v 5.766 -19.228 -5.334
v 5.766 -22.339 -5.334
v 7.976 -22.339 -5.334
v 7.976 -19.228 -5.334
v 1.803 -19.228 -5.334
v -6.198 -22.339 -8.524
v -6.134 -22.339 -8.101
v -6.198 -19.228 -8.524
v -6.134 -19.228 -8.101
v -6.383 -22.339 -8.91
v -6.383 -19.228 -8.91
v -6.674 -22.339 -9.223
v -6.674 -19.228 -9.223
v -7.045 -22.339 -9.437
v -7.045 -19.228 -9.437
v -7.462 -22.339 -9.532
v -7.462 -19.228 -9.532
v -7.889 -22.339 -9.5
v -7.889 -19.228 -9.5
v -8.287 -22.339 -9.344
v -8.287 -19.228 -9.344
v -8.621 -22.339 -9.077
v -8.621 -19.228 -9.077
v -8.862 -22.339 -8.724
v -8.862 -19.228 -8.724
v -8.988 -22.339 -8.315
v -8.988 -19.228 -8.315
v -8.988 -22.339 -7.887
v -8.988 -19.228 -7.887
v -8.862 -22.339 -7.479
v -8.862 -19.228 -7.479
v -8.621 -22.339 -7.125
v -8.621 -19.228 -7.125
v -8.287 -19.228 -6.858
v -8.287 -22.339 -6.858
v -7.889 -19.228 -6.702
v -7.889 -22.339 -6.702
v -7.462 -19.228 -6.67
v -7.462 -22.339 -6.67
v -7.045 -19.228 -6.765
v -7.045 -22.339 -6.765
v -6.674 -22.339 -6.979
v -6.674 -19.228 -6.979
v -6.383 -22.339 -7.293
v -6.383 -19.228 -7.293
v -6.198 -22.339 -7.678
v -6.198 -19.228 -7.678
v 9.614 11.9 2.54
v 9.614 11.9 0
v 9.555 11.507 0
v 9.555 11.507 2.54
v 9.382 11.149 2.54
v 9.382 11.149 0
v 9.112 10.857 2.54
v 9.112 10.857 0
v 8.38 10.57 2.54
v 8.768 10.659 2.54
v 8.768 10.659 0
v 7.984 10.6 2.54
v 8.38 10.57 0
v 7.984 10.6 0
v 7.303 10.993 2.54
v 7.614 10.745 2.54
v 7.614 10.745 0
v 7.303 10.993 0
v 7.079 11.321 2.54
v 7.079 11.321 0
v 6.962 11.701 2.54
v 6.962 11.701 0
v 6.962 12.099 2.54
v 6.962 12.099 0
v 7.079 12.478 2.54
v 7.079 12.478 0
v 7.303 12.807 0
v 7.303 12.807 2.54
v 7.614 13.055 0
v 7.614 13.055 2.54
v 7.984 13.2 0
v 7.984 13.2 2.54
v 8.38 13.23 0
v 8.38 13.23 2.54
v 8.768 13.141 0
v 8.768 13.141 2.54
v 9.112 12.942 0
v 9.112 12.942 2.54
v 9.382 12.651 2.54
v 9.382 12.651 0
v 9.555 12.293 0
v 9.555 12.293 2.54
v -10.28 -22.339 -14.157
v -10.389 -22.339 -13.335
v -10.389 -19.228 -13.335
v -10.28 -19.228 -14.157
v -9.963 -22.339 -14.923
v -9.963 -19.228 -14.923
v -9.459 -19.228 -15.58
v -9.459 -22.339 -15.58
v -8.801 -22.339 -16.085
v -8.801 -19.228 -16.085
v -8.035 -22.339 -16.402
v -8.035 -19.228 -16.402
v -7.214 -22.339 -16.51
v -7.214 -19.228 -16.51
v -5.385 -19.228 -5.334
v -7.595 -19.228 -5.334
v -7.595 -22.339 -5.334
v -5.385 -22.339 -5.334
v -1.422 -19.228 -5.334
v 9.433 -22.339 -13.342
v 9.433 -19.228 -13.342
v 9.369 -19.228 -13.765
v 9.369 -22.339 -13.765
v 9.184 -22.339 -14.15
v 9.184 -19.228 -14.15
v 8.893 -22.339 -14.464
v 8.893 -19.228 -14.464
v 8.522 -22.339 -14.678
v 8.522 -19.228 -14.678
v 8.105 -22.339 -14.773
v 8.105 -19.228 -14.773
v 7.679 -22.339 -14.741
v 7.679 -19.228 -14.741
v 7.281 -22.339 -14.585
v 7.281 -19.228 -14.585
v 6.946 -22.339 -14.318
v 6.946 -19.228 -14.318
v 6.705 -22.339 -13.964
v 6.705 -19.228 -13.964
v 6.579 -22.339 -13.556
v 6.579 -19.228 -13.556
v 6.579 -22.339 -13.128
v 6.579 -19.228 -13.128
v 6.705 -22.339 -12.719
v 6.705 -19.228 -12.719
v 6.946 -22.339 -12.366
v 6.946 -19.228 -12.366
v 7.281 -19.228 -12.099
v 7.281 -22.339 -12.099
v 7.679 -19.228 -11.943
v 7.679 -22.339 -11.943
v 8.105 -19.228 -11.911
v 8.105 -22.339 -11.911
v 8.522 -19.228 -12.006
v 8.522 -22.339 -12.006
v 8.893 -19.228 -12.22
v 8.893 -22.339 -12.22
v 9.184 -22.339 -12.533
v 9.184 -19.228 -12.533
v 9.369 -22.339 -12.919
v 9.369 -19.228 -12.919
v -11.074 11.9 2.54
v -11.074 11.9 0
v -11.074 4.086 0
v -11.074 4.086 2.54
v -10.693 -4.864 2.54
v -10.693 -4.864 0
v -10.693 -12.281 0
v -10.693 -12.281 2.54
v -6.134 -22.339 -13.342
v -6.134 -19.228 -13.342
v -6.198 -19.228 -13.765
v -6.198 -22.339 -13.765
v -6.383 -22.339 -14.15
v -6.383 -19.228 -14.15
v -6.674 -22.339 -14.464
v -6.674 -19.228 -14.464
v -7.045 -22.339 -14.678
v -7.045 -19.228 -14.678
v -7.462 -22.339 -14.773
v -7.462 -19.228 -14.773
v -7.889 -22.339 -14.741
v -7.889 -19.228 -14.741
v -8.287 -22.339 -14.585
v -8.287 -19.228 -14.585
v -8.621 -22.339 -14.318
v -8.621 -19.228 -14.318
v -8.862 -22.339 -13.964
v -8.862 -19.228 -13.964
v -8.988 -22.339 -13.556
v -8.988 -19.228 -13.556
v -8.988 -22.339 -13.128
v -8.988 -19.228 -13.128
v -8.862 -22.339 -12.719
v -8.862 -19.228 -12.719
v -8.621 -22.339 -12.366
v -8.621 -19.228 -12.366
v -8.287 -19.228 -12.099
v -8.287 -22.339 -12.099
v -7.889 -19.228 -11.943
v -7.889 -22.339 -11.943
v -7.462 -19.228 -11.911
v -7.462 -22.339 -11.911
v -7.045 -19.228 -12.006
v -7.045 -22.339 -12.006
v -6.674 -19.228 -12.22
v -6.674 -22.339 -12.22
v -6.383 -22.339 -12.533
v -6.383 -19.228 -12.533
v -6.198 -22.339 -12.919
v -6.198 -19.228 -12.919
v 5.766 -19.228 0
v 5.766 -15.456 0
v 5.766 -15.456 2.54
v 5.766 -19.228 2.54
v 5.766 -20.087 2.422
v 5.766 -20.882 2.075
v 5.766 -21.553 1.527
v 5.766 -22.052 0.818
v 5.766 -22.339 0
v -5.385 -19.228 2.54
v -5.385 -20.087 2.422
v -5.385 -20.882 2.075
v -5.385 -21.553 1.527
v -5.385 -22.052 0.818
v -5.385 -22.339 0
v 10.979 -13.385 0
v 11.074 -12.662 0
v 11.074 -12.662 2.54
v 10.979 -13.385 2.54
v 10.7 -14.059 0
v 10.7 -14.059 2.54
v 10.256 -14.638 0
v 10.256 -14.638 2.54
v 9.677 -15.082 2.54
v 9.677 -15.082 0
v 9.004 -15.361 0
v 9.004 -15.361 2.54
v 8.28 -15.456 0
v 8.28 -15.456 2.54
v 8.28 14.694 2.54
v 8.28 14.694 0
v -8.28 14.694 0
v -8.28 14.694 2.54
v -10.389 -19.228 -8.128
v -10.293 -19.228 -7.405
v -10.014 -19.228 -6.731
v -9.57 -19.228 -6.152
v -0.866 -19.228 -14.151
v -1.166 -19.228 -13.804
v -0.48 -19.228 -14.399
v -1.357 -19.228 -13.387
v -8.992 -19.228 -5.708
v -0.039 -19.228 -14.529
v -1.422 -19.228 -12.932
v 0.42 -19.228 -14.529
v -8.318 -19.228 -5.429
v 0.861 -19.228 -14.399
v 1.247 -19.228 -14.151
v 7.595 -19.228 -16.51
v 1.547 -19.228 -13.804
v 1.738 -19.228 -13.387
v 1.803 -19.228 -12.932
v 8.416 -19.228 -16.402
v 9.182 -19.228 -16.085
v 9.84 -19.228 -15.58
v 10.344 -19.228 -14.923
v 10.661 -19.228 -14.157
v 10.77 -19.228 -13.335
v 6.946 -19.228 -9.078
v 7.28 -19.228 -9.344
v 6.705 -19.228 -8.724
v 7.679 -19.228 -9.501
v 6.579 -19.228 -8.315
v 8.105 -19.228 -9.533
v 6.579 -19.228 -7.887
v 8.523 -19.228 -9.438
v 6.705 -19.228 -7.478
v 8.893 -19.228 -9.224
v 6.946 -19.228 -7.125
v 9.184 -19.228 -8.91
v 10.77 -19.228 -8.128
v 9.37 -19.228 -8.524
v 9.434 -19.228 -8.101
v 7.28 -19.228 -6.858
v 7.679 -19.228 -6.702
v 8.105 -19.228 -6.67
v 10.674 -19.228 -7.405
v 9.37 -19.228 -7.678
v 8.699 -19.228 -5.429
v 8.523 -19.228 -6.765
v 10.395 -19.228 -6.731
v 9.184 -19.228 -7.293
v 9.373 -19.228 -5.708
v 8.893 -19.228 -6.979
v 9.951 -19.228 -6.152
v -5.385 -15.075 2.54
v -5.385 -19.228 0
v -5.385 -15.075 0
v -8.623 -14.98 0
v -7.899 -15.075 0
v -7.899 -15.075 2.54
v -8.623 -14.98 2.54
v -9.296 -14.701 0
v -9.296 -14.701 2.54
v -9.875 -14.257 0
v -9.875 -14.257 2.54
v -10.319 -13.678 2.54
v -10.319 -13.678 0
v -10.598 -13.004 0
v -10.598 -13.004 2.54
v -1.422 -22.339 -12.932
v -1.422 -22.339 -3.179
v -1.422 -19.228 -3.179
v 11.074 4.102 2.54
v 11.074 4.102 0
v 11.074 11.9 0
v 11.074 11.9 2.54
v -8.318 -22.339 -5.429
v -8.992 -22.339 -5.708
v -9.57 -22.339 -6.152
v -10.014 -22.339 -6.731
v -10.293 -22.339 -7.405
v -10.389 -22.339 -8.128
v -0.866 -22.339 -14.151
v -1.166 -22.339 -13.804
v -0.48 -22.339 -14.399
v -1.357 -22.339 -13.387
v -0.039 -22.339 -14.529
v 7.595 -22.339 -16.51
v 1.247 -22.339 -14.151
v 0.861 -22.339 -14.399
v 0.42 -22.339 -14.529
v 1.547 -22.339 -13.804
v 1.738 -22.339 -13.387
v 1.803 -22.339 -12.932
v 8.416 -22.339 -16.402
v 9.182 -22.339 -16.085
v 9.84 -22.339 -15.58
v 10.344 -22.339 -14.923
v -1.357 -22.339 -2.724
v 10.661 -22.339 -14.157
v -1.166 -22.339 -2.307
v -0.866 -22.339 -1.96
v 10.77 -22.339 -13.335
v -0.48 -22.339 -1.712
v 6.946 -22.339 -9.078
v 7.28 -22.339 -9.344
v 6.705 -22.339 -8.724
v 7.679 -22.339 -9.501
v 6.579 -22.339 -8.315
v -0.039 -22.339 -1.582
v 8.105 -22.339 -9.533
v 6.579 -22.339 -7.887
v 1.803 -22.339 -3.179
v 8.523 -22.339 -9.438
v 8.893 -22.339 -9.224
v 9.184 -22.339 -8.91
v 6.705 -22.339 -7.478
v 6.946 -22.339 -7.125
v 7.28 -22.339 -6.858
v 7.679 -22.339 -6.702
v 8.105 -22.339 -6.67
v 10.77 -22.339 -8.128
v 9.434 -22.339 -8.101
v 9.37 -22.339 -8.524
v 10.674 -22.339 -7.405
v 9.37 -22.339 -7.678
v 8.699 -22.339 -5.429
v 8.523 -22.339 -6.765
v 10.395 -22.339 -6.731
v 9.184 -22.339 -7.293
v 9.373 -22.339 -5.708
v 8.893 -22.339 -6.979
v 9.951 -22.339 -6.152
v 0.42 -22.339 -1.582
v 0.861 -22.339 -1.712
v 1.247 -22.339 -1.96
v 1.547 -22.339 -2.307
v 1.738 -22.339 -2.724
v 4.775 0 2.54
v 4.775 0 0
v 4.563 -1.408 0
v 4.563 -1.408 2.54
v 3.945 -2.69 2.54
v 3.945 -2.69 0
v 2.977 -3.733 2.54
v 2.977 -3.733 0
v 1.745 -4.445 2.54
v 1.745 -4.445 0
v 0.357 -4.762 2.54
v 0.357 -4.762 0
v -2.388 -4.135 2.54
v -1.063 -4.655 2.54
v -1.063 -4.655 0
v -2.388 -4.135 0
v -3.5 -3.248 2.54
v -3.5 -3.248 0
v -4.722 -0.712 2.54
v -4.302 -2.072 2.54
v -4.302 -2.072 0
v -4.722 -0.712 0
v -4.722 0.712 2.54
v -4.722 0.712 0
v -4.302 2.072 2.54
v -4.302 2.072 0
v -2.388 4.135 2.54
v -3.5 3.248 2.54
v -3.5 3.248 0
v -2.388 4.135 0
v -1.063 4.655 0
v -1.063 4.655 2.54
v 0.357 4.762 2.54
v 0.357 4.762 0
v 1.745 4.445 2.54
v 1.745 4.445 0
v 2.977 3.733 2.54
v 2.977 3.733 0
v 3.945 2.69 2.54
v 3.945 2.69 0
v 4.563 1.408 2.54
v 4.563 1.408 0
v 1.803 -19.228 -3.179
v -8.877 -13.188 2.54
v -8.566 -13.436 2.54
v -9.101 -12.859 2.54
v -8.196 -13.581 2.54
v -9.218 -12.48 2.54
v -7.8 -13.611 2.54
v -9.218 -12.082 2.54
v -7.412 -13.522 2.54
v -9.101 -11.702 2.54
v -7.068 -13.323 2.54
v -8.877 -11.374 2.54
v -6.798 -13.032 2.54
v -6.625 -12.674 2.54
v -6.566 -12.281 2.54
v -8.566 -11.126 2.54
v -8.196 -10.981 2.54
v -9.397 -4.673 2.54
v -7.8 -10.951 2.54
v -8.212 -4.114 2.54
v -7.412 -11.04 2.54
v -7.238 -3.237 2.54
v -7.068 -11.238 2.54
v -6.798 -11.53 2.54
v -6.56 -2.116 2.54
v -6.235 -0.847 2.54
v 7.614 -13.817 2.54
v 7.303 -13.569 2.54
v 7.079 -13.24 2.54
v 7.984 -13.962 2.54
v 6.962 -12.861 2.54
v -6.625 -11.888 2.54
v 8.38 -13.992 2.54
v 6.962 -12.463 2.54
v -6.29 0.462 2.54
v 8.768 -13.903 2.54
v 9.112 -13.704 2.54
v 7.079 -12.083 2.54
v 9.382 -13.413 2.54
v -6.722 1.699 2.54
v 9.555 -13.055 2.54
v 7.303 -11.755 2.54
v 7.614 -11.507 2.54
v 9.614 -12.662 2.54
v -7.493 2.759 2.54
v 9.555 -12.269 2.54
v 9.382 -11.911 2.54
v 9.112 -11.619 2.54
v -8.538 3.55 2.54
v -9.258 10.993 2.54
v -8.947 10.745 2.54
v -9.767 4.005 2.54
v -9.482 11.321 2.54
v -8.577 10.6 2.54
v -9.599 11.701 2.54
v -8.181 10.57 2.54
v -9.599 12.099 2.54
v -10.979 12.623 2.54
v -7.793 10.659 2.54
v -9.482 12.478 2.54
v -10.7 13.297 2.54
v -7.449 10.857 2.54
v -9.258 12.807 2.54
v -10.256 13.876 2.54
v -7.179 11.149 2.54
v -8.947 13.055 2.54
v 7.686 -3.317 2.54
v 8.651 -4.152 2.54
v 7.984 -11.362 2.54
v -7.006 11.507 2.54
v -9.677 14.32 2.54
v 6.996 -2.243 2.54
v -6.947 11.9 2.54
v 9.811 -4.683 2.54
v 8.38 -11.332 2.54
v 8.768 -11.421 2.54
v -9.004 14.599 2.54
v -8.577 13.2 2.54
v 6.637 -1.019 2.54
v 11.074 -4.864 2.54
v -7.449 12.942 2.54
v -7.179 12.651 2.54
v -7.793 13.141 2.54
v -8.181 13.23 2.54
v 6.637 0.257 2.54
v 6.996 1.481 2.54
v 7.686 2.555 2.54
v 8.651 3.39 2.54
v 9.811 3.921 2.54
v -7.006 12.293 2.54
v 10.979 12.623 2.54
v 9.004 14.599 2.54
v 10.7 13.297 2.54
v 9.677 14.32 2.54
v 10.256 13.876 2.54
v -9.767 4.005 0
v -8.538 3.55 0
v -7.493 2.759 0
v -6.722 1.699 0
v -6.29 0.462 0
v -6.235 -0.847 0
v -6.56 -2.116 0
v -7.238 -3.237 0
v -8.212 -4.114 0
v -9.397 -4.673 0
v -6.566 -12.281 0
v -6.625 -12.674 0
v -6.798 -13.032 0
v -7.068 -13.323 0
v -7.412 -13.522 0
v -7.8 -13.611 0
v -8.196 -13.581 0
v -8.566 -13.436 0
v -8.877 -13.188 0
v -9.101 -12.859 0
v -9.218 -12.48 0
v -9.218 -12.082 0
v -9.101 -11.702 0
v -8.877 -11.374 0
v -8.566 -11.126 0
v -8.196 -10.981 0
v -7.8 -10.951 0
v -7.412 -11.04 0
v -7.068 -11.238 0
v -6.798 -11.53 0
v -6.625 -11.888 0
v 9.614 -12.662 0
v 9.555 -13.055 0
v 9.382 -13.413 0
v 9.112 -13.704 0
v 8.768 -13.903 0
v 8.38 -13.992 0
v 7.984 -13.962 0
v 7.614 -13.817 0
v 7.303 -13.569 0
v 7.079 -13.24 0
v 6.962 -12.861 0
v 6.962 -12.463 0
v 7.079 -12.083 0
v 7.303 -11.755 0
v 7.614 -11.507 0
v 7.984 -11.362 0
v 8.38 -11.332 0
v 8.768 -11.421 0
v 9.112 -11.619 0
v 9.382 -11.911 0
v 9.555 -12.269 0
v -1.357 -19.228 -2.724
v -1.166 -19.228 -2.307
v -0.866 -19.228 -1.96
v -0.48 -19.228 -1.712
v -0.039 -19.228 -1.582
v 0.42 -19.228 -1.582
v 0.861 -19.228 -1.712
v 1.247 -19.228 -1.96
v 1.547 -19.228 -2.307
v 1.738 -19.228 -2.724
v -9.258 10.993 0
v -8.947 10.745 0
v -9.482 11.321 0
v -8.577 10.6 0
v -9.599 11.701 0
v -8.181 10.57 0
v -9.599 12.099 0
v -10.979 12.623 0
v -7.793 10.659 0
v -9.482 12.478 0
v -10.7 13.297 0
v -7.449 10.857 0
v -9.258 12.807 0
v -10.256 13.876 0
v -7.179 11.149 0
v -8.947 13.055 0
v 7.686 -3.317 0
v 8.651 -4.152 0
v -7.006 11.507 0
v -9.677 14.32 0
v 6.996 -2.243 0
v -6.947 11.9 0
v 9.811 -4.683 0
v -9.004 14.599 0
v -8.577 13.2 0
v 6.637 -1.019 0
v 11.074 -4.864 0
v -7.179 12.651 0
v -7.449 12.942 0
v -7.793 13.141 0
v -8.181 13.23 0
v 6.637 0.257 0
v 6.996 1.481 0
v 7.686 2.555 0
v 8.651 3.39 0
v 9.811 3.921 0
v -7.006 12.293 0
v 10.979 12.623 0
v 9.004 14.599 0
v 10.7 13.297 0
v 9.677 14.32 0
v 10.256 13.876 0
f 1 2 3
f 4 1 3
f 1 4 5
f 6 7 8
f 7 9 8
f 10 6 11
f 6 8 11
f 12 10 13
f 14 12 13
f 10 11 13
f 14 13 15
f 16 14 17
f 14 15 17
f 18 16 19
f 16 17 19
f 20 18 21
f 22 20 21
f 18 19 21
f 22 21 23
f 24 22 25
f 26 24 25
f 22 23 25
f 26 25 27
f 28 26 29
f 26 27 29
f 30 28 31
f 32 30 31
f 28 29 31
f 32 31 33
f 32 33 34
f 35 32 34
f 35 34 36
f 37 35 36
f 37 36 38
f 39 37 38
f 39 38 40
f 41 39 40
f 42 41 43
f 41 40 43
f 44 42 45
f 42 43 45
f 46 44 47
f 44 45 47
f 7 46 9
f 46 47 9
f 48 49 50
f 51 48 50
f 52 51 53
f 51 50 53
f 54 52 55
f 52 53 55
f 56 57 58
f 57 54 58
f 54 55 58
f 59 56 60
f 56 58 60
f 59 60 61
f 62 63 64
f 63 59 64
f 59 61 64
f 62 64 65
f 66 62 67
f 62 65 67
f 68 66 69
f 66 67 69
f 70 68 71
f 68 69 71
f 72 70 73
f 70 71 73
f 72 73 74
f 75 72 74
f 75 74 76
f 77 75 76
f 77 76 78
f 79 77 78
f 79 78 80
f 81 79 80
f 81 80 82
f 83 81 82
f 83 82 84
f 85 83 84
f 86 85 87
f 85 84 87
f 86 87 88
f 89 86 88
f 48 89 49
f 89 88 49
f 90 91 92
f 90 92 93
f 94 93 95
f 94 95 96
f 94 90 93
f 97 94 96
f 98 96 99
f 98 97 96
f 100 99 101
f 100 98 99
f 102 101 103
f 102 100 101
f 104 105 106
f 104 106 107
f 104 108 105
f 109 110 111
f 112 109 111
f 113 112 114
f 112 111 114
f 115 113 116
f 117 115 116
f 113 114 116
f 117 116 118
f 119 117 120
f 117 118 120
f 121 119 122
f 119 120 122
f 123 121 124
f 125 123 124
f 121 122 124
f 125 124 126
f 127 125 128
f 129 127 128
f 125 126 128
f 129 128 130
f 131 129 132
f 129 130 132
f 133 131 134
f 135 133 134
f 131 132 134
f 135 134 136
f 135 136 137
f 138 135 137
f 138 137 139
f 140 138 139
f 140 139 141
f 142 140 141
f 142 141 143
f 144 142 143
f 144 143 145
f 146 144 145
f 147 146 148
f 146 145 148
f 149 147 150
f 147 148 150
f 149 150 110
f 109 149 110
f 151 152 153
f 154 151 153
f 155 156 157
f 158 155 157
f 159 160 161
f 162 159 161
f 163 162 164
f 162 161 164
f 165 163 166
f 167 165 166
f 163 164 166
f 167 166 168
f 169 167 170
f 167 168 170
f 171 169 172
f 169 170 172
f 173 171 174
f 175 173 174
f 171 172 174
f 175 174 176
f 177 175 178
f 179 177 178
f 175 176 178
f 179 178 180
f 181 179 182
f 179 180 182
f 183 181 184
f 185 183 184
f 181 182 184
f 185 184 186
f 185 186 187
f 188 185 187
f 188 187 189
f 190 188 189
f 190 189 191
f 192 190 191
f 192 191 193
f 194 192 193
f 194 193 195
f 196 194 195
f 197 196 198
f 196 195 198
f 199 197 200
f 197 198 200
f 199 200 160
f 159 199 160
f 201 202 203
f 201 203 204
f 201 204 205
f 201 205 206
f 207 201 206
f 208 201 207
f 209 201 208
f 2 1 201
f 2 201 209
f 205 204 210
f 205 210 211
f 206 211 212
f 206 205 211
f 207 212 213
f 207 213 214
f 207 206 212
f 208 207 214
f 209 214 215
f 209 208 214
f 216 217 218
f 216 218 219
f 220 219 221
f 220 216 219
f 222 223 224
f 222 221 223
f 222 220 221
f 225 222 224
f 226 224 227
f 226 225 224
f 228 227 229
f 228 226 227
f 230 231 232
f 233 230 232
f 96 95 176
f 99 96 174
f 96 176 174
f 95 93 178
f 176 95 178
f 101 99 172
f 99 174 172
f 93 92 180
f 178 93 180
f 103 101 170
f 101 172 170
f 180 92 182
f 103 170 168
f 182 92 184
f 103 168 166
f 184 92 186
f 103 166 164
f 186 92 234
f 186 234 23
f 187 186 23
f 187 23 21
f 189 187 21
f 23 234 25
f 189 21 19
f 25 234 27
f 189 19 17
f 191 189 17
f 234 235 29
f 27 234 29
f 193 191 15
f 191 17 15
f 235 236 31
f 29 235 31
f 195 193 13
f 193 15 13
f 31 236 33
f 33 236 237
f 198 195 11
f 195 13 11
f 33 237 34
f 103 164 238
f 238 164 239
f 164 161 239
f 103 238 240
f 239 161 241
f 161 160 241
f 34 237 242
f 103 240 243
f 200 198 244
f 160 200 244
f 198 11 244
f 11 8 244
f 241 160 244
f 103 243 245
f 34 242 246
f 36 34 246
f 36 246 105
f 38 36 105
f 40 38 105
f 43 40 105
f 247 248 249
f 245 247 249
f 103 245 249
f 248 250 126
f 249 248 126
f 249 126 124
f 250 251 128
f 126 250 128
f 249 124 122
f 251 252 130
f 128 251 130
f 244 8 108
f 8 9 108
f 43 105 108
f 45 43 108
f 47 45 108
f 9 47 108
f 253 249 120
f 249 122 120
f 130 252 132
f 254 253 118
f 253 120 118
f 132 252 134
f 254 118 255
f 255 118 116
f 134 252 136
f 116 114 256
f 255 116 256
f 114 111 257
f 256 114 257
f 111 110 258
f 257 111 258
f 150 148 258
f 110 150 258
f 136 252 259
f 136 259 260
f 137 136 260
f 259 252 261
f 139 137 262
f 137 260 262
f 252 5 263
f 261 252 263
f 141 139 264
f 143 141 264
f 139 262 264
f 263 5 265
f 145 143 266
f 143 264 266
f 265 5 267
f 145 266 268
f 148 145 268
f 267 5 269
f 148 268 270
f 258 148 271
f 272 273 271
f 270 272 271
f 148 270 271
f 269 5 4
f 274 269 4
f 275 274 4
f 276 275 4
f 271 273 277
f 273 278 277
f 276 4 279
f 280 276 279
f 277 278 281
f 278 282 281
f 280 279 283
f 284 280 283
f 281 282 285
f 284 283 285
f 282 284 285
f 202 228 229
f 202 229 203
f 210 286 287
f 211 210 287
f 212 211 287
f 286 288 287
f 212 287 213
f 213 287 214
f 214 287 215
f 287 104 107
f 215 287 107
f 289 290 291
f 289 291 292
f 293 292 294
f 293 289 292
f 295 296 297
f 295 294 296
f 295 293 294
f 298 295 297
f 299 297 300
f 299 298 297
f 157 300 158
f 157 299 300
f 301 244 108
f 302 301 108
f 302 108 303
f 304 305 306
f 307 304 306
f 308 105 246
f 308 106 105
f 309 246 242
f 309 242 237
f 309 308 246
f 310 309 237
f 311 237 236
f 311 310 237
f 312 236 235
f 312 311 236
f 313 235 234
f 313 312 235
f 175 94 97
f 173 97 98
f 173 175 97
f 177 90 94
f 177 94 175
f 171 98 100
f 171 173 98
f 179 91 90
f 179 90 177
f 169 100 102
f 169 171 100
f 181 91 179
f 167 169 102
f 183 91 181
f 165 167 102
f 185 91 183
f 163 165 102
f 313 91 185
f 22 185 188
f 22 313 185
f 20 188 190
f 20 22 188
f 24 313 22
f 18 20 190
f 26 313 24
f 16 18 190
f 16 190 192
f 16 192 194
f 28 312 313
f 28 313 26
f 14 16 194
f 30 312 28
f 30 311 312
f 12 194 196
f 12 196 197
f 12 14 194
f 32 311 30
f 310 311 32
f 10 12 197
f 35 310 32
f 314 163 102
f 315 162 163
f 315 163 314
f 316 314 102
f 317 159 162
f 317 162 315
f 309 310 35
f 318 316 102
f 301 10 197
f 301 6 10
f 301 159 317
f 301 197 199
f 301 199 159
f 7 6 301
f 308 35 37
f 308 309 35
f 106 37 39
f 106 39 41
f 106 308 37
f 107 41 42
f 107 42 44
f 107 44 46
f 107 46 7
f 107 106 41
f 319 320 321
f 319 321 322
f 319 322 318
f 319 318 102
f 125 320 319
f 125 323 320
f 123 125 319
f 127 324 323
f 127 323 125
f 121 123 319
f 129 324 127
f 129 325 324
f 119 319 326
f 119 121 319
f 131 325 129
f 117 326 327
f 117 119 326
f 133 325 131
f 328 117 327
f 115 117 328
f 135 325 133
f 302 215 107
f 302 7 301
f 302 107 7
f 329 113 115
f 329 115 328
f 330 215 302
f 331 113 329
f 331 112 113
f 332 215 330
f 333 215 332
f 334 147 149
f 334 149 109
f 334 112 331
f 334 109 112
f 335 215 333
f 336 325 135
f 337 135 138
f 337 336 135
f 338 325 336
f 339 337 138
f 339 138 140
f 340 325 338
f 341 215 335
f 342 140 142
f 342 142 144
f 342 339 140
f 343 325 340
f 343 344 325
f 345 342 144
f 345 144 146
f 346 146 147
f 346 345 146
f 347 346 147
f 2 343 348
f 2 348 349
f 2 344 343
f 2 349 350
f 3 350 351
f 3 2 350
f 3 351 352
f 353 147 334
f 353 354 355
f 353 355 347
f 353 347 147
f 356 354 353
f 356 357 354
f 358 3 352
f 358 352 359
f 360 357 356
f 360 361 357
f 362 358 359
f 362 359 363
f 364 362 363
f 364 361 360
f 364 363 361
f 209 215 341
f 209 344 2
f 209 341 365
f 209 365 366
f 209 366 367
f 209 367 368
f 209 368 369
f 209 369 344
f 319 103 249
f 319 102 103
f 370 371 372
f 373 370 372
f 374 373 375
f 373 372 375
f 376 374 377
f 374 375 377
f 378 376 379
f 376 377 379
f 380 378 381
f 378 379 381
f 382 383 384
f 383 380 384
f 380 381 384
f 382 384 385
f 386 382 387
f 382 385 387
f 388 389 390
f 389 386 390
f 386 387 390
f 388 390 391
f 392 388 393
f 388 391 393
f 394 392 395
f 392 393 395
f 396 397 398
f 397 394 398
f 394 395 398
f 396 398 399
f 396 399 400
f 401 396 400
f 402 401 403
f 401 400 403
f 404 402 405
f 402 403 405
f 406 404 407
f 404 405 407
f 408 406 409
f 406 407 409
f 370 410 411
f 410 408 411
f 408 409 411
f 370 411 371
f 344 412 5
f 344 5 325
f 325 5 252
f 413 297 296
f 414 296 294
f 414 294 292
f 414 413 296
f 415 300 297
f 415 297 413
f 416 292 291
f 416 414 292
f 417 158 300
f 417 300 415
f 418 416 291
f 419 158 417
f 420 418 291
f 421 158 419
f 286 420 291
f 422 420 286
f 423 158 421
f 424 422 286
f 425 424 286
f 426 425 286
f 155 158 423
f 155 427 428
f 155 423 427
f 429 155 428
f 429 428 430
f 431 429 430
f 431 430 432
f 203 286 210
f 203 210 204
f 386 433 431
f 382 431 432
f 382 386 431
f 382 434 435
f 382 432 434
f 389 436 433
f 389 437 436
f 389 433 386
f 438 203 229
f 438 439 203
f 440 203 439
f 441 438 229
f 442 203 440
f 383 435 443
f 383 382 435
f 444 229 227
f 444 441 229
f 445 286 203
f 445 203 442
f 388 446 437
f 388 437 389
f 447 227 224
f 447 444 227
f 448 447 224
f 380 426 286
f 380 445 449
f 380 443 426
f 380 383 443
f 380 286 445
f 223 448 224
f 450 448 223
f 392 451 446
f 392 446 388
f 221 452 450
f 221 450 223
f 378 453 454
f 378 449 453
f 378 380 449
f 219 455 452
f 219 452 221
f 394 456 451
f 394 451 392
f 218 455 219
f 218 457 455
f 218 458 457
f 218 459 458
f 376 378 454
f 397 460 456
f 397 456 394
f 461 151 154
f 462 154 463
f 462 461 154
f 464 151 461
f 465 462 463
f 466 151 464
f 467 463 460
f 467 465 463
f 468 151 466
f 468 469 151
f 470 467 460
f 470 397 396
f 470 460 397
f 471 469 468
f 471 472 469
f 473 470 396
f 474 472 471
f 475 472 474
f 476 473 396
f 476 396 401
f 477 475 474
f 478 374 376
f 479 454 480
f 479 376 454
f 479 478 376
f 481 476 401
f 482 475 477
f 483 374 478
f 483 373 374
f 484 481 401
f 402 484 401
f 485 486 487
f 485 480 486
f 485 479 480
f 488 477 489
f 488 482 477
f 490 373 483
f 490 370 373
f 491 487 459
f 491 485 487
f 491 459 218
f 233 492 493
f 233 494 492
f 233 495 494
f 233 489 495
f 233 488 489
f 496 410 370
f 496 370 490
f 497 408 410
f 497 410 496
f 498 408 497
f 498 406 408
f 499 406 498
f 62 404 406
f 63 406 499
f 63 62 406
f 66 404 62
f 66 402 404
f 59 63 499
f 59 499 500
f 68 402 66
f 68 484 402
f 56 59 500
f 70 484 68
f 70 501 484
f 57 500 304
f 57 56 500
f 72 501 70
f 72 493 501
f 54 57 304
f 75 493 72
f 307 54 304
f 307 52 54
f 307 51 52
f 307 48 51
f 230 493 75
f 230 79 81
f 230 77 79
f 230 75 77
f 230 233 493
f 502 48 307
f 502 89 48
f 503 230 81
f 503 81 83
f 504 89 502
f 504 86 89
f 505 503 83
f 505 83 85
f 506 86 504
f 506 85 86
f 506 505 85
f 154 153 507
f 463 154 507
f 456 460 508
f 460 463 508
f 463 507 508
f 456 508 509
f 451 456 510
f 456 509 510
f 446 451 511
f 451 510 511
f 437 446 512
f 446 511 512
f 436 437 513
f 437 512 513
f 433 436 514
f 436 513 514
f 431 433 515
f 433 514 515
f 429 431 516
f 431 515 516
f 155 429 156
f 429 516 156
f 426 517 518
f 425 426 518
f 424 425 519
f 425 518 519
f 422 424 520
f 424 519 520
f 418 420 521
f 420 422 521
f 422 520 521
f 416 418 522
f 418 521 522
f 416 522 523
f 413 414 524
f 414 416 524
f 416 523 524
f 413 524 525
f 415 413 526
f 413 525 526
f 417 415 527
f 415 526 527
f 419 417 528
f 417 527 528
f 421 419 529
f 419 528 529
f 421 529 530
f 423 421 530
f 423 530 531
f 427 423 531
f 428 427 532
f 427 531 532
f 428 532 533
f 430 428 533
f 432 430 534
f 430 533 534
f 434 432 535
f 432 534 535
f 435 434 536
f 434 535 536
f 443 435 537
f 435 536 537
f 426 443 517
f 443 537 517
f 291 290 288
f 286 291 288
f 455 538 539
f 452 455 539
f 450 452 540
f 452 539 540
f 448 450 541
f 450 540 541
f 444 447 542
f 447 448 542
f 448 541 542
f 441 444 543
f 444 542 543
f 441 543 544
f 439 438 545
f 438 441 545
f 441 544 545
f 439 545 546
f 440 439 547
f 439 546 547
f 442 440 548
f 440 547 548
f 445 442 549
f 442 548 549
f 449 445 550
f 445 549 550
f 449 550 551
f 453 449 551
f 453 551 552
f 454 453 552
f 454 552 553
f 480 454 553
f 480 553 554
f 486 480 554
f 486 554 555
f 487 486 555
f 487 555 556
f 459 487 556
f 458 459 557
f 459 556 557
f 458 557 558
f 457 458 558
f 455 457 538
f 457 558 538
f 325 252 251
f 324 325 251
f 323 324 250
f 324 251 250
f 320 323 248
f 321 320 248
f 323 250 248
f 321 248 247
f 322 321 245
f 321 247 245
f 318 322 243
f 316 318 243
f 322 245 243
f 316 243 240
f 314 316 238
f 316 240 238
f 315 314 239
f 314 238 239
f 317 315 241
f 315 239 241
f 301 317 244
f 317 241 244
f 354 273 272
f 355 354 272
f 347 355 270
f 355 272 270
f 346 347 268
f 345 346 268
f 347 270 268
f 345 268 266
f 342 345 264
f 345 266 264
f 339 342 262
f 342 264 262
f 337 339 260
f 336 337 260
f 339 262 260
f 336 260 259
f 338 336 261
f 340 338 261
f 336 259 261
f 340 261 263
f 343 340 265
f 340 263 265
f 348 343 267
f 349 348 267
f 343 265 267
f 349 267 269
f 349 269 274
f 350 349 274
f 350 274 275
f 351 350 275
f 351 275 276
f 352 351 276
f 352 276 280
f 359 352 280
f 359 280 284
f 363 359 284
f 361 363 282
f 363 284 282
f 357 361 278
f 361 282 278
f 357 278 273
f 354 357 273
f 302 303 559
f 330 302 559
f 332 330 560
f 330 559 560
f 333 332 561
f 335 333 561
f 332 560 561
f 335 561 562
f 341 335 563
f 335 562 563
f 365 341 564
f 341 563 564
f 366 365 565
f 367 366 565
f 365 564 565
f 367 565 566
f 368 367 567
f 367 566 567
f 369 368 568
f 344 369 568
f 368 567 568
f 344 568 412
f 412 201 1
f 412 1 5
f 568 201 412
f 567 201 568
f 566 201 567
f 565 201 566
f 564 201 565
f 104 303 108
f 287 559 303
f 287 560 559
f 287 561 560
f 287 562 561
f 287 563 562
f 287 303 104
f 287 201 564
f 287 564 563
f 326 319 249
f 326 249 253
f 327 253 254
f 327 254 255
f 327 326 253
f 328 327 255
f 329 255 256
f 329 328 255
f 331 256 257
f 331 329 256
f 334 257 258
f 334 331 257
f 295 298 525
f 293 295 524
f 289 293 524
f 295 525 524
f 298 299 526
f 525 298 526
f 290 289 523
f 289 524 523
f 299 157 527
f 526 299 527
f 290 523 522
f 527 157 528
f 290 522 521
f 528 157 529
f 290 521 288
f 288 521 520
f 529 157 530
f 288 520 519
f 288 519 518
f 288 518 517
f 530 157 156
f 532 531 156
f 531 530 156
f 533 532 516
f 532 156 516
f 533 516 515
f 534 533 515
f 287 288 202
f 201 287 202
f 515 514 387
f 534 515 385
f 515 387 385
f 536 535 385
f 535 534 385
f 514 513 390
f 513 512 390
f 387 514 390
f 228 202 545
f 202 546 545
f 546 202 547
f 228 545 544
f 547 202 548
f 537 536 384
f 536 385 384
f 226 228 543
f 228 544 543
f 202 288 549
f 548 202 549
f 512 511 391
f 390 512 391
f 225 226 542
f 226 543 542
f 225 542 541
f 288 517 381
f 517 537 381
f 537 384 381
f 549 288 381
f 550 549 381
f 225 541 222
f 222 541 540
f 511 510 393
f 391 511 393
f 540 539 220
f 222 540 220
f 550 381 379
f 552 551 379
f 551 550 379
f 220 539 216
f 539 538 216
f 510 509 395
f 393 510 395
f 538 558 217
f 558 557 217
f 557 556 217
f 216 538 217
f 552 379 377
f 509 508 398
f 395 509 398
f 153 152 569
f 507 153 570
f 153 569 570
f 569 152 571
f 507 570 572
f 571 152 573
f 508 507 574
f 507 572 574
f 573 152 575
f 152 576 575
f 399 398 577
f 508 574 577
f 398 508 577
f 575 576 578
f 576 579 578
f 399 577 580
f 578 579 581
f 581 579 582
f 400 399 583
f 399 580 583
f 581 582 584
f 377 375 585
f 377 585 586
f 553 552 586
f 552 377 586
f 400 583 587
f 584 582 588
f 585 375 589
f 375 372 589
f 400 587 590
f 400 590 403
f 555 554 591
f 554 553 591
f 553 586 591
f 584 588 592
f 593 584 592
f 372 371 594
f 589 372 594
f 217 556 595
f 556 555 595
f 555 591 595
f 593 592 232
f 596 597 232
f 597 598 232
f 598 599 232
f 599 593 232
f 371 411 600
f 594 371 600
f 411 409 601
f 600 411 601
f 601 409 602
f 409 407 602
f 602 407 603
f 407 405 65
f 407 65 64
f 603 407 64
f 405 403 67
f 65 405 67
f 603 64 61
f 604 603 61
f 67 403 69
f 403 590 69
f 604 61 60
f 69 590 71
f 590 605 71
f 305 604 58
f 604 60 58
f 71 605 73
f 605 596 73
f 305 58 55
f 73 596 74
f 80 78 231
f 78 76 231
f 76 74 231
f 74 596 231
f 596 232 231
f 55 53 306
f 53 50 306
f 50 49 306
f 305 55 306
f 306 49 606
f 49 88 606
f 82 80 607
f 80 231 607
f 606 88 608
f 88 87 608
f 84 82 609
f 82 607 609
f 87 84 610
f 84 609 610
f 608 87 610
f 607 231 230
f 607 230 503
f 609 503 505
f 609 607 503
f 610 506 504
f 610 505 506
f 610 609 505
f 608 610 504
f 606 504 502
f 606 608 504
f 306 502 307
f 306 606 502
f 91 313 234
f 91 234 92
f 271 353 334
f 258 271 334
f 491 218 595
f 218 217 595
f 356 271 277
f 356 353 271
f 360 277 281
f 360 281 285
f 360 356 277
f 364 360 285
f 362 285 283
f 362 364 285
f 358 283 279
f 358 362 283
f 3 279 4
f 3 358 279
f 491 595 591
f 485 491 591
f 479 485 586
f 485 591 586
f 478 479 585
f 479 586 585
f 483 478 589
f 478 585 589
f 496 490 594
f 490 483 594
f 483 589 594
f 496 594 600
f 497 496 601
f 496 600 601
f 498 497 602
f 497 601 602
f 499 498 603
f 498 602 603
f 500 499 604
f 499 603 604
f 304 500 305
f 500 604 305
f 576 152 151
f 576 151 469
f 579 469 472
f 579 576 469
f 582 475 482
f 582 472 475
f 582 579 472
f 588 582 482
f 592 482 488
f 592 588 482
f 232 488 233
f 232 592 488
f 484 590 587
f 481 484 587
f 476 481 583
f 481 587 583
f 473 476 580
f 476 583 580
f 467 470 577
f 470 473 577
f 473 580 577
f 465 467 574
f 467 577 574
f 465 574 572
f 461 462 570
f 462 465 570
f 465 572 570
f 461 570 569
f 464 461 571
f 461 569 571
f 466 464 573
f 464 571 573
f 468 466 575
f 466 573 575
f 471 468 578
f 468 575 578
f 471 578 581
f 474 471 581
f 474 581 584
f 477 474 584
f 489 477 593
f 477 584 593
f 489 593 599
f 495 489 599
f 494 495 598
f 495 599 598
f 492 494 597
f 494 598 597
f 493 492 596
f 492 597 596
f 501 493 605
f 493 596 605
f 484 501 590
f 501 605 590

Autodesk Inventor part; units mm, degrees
ref_plane "YZ Plane" through (0, 0, 0) normal (1, 0, 0) x (0, 1, 0)
ref_plane "XZ Plane" through (0, 0, 0) normal (0, 1, 0) x (-1, 0, 0)
ref_plane "XY Plane" through (0, 0, 0) normal (0, 0, 1) x (1, 0, 0)
sketch "Sketch1" plane through (0, 0, 0) normal (0, 0, 1) x (1, 0, 0)
  line L0 (8.2804, 14.6939) -> (-8.2804, 14.6939)
  circle A0 centre (0, 0) radius 4.7752
  line L1 (-7.8994, -15.0749) -> (-5.3848, -15.0749)
  line L2 (-5.3848, -15.0749) -> (-5.3848, -22.3393)
  line L3 (8.2804, -15.4559) -> (5.7658, -15.4559)
  line L4 (5.7658, -15.4559) -> (5.7658, -22.3393)
  line L5 (5.7658, -22.3393) -> (-5.3848, -22.3393)
  arc A1 (-10.6934, -4.8641) -> (-11.0744, 4.0859) centre (-10.6934, -0.381) ccw
  line L6 (-11.0744, 11.8999) -> (-11.0744, 4.0859)
  line L7 (-10.6934, -4.8641) -> (-10.6934, -12.2809)
  arc A2 (11.0744, 4.1021) -> (11.0744, -4.8641) centre (11.0744, -0.381) ccw
  line L8 (11.0744, -12.6619) -> (11.0744, -4.8641)
  line L9 (11.0744, 4.1021) -> (11.0744, 11.8999)
  arc A3 (-8.2804, 14.6939) -> (-11.0744, 11.8999) centre (-8.2804, 11.8999) ccw
  arc A4 (11.0744, 11.8999) -> (8.2804, 14.6939) centre (8.2804, 11.8999) ccw
  arc A5 (8.2804, -15.4559) -> (11.0744, -12.6619) centre (8.2804, -12.6619) ccw
  arc A6 (-10.6934, -12.2809) -> (-7.8994, -15.0749) centre (-7.8994, -12.2809) ccw
  circle A7 centre (-8.2804, 11.8999) radius 1.3335
  circle A8 centre (8.2804, 11.8999) radius 1.3335
  circle A9 centre (8.2804, -12.6619) radius 1.3335
  circle A10 centre (-7.8994, -12.2809) radius 1.3335
  point P0 (-10.6934, -15.0749)
  point P1 (11.0744, 14.6939)
  point P2 (11.0744, -15.4559)
  point P3 (-11.0744, 14.6939)
  dimension "d0" = 30.1498
  dimension "d1" = 22.1488
  dimension "d2" = 9.5504
  dimension "d3" = 5.3086
  dimension "d4" = 7.2644
  dimension "d5" = 5.3086
  dimension "d6" = 8.9662
  dimension "d7" = 8.9662
  dimension "d11" = 2.794
  dimension "d12" = 2.667
  dimension "d13" = 2.667
  dimension "d14" = 2.667
  dimension "d15" = 2.667
extrude "Extrusion1" add sketch "Sketch1" along normal blind 2.54
fillet "Fillet1" radius 3.175 1 edges at (0.1905, -22.3393, 2.54)
sketch "Sketch2" plane through (0, 0, 0) normal (0, 0, -1) x (-1, 0, 0)
  line L0 (-5.7658, -19.2284) -> (5.3848, -19.2284) projected
  line L1 (-5.7658, -19.2284) -> (5.3848, -19.2284)
  line L2 (-5.7658, -22.3393) -> (-5.7658, -19.2284) projected
  line L3 (-5.7658, -19.2284) -> (-5.7658, -22.3393)
  line L4 (-5.7658, -22.3393) -> (5.3848, -22.3393) projected
  line L5 (-5.7658, -22.3393) -> (5.3848, -22.3393)
  line L6 (5.3848, -19.2284) -> (5.3848, -22.3393) projected
  line L7 (5.3848, -22.3393) -> (5.3848, -19.2284)
  point P0 (0, 0)
extrude "Extrusion2" add sketch "Sketch2" along normal blind 5.334
sketch "Sketch6" plane through (-5.3848, -22.3393, 0) normal (0, -1, 0) x (1, 0, 0)
  line L0 (11.1506, -5.334) -> (13.3604, -5.334)
  line L1 (16.1544, -8.128) -> (16.1544, -13.335)
  line L2 (0, -5.334) -> (-2.2098, -5.334)
  line L3 (-5.0038, -8.128) -> (-5.0038, -13.335)
  line L4 (-1.8288, -16.51) -> (12.9794, -16.51)
  line L5 (0, -5.334) -> (11.1506, -5.334) projected
  line L6 (0, -5.334) -> (11.1506, -5.334)
  arc A0 (12.9794, -16.51) -> (16.1544, -13.335) centre (12.9794, -13.335) ccw
  arc A1 (-5.0038, -13.335) -> (-1.8288, -16.51) centre (-1.8288, -13.335) ccw
  arc A2 (16.1544, -8.128) -> (13.3604, -5.334) centre (13.3604, -8.128) ccw
  arc A3 (-2.2098, -5.334) -> (-5.0038, -8.128) centre (-2.2098, -8.128) ccw
  point P0 (5.3848, 0)
  point P1 (16.1544, -5.334)
  point P2 (16.1544, -16.51)
  point P3 (-5.0038, -5.334)
  point P4 (-5.0038, -16.51)
  dimension "d30" = 5.0038
  dimension "d32" = 5.0038
  dimension "d35" = 3.175
  dimension "d36" = 2.794
extrude "Extrusion3" add sketch "Sketch6" against normal blind 3.1115
sketch "Sketch7" plane through (-5.3848, -19.2278, 0) normal (0, 1, 0) x (1, 0, 0)
  line L0 (0, 5.334) -> (11.1506, 5.334) projected
  line L1 (-1.8288, 16.51) -> (12.9794, 16.51) projected
  line L2 (3.9624, 12.9323) -> (3.9624, 3.1787)
  line L3 (7.1882, 3.1787) -> (7.1882, 12.9323)
  arc A0 (7.1882, 12.9323) -> (3.9624, 12.9323) centre (5.5753, 12.9323) ccw
  arc A1 (3.9624, 3.1787) -> (7.1882, 3.1787) centre (5.5753, 3.1787) ccw
  point P0 (5.3848, 0)
  point P1 (5.5753, 8.0555)
  dimension "d37" = 9.7536
  dimension "d38" = 3.2258
extrude "Extrusion4" cut sketch "Sketch7" against normal blind 76.2
sketch "Sketch8" plane through (-5.3848, -19.2278, 0) normal (0, 1, 0) x (1, 0, 0)
  circle A0 centre (13.3829, 13.3417) radius 1.4351
  circle A1 centre (13.3829, 8.1013) radius 1.4355
  circle A2 centre (-2.1844, 8.1013) radius 1.4351
  circle A3 centre (-2.1844, 13.3417) radius 1.4351
  point P0 (5.3848, 0)
  dimension "d48" = 2.8702
  dimension "d49" = 2.8702
  dimension "d50" = 2.8702
extrude "Extrusion5" cut sketch "Sketch8" against normal blind 76.2
properties part number "cwmotorholder"
